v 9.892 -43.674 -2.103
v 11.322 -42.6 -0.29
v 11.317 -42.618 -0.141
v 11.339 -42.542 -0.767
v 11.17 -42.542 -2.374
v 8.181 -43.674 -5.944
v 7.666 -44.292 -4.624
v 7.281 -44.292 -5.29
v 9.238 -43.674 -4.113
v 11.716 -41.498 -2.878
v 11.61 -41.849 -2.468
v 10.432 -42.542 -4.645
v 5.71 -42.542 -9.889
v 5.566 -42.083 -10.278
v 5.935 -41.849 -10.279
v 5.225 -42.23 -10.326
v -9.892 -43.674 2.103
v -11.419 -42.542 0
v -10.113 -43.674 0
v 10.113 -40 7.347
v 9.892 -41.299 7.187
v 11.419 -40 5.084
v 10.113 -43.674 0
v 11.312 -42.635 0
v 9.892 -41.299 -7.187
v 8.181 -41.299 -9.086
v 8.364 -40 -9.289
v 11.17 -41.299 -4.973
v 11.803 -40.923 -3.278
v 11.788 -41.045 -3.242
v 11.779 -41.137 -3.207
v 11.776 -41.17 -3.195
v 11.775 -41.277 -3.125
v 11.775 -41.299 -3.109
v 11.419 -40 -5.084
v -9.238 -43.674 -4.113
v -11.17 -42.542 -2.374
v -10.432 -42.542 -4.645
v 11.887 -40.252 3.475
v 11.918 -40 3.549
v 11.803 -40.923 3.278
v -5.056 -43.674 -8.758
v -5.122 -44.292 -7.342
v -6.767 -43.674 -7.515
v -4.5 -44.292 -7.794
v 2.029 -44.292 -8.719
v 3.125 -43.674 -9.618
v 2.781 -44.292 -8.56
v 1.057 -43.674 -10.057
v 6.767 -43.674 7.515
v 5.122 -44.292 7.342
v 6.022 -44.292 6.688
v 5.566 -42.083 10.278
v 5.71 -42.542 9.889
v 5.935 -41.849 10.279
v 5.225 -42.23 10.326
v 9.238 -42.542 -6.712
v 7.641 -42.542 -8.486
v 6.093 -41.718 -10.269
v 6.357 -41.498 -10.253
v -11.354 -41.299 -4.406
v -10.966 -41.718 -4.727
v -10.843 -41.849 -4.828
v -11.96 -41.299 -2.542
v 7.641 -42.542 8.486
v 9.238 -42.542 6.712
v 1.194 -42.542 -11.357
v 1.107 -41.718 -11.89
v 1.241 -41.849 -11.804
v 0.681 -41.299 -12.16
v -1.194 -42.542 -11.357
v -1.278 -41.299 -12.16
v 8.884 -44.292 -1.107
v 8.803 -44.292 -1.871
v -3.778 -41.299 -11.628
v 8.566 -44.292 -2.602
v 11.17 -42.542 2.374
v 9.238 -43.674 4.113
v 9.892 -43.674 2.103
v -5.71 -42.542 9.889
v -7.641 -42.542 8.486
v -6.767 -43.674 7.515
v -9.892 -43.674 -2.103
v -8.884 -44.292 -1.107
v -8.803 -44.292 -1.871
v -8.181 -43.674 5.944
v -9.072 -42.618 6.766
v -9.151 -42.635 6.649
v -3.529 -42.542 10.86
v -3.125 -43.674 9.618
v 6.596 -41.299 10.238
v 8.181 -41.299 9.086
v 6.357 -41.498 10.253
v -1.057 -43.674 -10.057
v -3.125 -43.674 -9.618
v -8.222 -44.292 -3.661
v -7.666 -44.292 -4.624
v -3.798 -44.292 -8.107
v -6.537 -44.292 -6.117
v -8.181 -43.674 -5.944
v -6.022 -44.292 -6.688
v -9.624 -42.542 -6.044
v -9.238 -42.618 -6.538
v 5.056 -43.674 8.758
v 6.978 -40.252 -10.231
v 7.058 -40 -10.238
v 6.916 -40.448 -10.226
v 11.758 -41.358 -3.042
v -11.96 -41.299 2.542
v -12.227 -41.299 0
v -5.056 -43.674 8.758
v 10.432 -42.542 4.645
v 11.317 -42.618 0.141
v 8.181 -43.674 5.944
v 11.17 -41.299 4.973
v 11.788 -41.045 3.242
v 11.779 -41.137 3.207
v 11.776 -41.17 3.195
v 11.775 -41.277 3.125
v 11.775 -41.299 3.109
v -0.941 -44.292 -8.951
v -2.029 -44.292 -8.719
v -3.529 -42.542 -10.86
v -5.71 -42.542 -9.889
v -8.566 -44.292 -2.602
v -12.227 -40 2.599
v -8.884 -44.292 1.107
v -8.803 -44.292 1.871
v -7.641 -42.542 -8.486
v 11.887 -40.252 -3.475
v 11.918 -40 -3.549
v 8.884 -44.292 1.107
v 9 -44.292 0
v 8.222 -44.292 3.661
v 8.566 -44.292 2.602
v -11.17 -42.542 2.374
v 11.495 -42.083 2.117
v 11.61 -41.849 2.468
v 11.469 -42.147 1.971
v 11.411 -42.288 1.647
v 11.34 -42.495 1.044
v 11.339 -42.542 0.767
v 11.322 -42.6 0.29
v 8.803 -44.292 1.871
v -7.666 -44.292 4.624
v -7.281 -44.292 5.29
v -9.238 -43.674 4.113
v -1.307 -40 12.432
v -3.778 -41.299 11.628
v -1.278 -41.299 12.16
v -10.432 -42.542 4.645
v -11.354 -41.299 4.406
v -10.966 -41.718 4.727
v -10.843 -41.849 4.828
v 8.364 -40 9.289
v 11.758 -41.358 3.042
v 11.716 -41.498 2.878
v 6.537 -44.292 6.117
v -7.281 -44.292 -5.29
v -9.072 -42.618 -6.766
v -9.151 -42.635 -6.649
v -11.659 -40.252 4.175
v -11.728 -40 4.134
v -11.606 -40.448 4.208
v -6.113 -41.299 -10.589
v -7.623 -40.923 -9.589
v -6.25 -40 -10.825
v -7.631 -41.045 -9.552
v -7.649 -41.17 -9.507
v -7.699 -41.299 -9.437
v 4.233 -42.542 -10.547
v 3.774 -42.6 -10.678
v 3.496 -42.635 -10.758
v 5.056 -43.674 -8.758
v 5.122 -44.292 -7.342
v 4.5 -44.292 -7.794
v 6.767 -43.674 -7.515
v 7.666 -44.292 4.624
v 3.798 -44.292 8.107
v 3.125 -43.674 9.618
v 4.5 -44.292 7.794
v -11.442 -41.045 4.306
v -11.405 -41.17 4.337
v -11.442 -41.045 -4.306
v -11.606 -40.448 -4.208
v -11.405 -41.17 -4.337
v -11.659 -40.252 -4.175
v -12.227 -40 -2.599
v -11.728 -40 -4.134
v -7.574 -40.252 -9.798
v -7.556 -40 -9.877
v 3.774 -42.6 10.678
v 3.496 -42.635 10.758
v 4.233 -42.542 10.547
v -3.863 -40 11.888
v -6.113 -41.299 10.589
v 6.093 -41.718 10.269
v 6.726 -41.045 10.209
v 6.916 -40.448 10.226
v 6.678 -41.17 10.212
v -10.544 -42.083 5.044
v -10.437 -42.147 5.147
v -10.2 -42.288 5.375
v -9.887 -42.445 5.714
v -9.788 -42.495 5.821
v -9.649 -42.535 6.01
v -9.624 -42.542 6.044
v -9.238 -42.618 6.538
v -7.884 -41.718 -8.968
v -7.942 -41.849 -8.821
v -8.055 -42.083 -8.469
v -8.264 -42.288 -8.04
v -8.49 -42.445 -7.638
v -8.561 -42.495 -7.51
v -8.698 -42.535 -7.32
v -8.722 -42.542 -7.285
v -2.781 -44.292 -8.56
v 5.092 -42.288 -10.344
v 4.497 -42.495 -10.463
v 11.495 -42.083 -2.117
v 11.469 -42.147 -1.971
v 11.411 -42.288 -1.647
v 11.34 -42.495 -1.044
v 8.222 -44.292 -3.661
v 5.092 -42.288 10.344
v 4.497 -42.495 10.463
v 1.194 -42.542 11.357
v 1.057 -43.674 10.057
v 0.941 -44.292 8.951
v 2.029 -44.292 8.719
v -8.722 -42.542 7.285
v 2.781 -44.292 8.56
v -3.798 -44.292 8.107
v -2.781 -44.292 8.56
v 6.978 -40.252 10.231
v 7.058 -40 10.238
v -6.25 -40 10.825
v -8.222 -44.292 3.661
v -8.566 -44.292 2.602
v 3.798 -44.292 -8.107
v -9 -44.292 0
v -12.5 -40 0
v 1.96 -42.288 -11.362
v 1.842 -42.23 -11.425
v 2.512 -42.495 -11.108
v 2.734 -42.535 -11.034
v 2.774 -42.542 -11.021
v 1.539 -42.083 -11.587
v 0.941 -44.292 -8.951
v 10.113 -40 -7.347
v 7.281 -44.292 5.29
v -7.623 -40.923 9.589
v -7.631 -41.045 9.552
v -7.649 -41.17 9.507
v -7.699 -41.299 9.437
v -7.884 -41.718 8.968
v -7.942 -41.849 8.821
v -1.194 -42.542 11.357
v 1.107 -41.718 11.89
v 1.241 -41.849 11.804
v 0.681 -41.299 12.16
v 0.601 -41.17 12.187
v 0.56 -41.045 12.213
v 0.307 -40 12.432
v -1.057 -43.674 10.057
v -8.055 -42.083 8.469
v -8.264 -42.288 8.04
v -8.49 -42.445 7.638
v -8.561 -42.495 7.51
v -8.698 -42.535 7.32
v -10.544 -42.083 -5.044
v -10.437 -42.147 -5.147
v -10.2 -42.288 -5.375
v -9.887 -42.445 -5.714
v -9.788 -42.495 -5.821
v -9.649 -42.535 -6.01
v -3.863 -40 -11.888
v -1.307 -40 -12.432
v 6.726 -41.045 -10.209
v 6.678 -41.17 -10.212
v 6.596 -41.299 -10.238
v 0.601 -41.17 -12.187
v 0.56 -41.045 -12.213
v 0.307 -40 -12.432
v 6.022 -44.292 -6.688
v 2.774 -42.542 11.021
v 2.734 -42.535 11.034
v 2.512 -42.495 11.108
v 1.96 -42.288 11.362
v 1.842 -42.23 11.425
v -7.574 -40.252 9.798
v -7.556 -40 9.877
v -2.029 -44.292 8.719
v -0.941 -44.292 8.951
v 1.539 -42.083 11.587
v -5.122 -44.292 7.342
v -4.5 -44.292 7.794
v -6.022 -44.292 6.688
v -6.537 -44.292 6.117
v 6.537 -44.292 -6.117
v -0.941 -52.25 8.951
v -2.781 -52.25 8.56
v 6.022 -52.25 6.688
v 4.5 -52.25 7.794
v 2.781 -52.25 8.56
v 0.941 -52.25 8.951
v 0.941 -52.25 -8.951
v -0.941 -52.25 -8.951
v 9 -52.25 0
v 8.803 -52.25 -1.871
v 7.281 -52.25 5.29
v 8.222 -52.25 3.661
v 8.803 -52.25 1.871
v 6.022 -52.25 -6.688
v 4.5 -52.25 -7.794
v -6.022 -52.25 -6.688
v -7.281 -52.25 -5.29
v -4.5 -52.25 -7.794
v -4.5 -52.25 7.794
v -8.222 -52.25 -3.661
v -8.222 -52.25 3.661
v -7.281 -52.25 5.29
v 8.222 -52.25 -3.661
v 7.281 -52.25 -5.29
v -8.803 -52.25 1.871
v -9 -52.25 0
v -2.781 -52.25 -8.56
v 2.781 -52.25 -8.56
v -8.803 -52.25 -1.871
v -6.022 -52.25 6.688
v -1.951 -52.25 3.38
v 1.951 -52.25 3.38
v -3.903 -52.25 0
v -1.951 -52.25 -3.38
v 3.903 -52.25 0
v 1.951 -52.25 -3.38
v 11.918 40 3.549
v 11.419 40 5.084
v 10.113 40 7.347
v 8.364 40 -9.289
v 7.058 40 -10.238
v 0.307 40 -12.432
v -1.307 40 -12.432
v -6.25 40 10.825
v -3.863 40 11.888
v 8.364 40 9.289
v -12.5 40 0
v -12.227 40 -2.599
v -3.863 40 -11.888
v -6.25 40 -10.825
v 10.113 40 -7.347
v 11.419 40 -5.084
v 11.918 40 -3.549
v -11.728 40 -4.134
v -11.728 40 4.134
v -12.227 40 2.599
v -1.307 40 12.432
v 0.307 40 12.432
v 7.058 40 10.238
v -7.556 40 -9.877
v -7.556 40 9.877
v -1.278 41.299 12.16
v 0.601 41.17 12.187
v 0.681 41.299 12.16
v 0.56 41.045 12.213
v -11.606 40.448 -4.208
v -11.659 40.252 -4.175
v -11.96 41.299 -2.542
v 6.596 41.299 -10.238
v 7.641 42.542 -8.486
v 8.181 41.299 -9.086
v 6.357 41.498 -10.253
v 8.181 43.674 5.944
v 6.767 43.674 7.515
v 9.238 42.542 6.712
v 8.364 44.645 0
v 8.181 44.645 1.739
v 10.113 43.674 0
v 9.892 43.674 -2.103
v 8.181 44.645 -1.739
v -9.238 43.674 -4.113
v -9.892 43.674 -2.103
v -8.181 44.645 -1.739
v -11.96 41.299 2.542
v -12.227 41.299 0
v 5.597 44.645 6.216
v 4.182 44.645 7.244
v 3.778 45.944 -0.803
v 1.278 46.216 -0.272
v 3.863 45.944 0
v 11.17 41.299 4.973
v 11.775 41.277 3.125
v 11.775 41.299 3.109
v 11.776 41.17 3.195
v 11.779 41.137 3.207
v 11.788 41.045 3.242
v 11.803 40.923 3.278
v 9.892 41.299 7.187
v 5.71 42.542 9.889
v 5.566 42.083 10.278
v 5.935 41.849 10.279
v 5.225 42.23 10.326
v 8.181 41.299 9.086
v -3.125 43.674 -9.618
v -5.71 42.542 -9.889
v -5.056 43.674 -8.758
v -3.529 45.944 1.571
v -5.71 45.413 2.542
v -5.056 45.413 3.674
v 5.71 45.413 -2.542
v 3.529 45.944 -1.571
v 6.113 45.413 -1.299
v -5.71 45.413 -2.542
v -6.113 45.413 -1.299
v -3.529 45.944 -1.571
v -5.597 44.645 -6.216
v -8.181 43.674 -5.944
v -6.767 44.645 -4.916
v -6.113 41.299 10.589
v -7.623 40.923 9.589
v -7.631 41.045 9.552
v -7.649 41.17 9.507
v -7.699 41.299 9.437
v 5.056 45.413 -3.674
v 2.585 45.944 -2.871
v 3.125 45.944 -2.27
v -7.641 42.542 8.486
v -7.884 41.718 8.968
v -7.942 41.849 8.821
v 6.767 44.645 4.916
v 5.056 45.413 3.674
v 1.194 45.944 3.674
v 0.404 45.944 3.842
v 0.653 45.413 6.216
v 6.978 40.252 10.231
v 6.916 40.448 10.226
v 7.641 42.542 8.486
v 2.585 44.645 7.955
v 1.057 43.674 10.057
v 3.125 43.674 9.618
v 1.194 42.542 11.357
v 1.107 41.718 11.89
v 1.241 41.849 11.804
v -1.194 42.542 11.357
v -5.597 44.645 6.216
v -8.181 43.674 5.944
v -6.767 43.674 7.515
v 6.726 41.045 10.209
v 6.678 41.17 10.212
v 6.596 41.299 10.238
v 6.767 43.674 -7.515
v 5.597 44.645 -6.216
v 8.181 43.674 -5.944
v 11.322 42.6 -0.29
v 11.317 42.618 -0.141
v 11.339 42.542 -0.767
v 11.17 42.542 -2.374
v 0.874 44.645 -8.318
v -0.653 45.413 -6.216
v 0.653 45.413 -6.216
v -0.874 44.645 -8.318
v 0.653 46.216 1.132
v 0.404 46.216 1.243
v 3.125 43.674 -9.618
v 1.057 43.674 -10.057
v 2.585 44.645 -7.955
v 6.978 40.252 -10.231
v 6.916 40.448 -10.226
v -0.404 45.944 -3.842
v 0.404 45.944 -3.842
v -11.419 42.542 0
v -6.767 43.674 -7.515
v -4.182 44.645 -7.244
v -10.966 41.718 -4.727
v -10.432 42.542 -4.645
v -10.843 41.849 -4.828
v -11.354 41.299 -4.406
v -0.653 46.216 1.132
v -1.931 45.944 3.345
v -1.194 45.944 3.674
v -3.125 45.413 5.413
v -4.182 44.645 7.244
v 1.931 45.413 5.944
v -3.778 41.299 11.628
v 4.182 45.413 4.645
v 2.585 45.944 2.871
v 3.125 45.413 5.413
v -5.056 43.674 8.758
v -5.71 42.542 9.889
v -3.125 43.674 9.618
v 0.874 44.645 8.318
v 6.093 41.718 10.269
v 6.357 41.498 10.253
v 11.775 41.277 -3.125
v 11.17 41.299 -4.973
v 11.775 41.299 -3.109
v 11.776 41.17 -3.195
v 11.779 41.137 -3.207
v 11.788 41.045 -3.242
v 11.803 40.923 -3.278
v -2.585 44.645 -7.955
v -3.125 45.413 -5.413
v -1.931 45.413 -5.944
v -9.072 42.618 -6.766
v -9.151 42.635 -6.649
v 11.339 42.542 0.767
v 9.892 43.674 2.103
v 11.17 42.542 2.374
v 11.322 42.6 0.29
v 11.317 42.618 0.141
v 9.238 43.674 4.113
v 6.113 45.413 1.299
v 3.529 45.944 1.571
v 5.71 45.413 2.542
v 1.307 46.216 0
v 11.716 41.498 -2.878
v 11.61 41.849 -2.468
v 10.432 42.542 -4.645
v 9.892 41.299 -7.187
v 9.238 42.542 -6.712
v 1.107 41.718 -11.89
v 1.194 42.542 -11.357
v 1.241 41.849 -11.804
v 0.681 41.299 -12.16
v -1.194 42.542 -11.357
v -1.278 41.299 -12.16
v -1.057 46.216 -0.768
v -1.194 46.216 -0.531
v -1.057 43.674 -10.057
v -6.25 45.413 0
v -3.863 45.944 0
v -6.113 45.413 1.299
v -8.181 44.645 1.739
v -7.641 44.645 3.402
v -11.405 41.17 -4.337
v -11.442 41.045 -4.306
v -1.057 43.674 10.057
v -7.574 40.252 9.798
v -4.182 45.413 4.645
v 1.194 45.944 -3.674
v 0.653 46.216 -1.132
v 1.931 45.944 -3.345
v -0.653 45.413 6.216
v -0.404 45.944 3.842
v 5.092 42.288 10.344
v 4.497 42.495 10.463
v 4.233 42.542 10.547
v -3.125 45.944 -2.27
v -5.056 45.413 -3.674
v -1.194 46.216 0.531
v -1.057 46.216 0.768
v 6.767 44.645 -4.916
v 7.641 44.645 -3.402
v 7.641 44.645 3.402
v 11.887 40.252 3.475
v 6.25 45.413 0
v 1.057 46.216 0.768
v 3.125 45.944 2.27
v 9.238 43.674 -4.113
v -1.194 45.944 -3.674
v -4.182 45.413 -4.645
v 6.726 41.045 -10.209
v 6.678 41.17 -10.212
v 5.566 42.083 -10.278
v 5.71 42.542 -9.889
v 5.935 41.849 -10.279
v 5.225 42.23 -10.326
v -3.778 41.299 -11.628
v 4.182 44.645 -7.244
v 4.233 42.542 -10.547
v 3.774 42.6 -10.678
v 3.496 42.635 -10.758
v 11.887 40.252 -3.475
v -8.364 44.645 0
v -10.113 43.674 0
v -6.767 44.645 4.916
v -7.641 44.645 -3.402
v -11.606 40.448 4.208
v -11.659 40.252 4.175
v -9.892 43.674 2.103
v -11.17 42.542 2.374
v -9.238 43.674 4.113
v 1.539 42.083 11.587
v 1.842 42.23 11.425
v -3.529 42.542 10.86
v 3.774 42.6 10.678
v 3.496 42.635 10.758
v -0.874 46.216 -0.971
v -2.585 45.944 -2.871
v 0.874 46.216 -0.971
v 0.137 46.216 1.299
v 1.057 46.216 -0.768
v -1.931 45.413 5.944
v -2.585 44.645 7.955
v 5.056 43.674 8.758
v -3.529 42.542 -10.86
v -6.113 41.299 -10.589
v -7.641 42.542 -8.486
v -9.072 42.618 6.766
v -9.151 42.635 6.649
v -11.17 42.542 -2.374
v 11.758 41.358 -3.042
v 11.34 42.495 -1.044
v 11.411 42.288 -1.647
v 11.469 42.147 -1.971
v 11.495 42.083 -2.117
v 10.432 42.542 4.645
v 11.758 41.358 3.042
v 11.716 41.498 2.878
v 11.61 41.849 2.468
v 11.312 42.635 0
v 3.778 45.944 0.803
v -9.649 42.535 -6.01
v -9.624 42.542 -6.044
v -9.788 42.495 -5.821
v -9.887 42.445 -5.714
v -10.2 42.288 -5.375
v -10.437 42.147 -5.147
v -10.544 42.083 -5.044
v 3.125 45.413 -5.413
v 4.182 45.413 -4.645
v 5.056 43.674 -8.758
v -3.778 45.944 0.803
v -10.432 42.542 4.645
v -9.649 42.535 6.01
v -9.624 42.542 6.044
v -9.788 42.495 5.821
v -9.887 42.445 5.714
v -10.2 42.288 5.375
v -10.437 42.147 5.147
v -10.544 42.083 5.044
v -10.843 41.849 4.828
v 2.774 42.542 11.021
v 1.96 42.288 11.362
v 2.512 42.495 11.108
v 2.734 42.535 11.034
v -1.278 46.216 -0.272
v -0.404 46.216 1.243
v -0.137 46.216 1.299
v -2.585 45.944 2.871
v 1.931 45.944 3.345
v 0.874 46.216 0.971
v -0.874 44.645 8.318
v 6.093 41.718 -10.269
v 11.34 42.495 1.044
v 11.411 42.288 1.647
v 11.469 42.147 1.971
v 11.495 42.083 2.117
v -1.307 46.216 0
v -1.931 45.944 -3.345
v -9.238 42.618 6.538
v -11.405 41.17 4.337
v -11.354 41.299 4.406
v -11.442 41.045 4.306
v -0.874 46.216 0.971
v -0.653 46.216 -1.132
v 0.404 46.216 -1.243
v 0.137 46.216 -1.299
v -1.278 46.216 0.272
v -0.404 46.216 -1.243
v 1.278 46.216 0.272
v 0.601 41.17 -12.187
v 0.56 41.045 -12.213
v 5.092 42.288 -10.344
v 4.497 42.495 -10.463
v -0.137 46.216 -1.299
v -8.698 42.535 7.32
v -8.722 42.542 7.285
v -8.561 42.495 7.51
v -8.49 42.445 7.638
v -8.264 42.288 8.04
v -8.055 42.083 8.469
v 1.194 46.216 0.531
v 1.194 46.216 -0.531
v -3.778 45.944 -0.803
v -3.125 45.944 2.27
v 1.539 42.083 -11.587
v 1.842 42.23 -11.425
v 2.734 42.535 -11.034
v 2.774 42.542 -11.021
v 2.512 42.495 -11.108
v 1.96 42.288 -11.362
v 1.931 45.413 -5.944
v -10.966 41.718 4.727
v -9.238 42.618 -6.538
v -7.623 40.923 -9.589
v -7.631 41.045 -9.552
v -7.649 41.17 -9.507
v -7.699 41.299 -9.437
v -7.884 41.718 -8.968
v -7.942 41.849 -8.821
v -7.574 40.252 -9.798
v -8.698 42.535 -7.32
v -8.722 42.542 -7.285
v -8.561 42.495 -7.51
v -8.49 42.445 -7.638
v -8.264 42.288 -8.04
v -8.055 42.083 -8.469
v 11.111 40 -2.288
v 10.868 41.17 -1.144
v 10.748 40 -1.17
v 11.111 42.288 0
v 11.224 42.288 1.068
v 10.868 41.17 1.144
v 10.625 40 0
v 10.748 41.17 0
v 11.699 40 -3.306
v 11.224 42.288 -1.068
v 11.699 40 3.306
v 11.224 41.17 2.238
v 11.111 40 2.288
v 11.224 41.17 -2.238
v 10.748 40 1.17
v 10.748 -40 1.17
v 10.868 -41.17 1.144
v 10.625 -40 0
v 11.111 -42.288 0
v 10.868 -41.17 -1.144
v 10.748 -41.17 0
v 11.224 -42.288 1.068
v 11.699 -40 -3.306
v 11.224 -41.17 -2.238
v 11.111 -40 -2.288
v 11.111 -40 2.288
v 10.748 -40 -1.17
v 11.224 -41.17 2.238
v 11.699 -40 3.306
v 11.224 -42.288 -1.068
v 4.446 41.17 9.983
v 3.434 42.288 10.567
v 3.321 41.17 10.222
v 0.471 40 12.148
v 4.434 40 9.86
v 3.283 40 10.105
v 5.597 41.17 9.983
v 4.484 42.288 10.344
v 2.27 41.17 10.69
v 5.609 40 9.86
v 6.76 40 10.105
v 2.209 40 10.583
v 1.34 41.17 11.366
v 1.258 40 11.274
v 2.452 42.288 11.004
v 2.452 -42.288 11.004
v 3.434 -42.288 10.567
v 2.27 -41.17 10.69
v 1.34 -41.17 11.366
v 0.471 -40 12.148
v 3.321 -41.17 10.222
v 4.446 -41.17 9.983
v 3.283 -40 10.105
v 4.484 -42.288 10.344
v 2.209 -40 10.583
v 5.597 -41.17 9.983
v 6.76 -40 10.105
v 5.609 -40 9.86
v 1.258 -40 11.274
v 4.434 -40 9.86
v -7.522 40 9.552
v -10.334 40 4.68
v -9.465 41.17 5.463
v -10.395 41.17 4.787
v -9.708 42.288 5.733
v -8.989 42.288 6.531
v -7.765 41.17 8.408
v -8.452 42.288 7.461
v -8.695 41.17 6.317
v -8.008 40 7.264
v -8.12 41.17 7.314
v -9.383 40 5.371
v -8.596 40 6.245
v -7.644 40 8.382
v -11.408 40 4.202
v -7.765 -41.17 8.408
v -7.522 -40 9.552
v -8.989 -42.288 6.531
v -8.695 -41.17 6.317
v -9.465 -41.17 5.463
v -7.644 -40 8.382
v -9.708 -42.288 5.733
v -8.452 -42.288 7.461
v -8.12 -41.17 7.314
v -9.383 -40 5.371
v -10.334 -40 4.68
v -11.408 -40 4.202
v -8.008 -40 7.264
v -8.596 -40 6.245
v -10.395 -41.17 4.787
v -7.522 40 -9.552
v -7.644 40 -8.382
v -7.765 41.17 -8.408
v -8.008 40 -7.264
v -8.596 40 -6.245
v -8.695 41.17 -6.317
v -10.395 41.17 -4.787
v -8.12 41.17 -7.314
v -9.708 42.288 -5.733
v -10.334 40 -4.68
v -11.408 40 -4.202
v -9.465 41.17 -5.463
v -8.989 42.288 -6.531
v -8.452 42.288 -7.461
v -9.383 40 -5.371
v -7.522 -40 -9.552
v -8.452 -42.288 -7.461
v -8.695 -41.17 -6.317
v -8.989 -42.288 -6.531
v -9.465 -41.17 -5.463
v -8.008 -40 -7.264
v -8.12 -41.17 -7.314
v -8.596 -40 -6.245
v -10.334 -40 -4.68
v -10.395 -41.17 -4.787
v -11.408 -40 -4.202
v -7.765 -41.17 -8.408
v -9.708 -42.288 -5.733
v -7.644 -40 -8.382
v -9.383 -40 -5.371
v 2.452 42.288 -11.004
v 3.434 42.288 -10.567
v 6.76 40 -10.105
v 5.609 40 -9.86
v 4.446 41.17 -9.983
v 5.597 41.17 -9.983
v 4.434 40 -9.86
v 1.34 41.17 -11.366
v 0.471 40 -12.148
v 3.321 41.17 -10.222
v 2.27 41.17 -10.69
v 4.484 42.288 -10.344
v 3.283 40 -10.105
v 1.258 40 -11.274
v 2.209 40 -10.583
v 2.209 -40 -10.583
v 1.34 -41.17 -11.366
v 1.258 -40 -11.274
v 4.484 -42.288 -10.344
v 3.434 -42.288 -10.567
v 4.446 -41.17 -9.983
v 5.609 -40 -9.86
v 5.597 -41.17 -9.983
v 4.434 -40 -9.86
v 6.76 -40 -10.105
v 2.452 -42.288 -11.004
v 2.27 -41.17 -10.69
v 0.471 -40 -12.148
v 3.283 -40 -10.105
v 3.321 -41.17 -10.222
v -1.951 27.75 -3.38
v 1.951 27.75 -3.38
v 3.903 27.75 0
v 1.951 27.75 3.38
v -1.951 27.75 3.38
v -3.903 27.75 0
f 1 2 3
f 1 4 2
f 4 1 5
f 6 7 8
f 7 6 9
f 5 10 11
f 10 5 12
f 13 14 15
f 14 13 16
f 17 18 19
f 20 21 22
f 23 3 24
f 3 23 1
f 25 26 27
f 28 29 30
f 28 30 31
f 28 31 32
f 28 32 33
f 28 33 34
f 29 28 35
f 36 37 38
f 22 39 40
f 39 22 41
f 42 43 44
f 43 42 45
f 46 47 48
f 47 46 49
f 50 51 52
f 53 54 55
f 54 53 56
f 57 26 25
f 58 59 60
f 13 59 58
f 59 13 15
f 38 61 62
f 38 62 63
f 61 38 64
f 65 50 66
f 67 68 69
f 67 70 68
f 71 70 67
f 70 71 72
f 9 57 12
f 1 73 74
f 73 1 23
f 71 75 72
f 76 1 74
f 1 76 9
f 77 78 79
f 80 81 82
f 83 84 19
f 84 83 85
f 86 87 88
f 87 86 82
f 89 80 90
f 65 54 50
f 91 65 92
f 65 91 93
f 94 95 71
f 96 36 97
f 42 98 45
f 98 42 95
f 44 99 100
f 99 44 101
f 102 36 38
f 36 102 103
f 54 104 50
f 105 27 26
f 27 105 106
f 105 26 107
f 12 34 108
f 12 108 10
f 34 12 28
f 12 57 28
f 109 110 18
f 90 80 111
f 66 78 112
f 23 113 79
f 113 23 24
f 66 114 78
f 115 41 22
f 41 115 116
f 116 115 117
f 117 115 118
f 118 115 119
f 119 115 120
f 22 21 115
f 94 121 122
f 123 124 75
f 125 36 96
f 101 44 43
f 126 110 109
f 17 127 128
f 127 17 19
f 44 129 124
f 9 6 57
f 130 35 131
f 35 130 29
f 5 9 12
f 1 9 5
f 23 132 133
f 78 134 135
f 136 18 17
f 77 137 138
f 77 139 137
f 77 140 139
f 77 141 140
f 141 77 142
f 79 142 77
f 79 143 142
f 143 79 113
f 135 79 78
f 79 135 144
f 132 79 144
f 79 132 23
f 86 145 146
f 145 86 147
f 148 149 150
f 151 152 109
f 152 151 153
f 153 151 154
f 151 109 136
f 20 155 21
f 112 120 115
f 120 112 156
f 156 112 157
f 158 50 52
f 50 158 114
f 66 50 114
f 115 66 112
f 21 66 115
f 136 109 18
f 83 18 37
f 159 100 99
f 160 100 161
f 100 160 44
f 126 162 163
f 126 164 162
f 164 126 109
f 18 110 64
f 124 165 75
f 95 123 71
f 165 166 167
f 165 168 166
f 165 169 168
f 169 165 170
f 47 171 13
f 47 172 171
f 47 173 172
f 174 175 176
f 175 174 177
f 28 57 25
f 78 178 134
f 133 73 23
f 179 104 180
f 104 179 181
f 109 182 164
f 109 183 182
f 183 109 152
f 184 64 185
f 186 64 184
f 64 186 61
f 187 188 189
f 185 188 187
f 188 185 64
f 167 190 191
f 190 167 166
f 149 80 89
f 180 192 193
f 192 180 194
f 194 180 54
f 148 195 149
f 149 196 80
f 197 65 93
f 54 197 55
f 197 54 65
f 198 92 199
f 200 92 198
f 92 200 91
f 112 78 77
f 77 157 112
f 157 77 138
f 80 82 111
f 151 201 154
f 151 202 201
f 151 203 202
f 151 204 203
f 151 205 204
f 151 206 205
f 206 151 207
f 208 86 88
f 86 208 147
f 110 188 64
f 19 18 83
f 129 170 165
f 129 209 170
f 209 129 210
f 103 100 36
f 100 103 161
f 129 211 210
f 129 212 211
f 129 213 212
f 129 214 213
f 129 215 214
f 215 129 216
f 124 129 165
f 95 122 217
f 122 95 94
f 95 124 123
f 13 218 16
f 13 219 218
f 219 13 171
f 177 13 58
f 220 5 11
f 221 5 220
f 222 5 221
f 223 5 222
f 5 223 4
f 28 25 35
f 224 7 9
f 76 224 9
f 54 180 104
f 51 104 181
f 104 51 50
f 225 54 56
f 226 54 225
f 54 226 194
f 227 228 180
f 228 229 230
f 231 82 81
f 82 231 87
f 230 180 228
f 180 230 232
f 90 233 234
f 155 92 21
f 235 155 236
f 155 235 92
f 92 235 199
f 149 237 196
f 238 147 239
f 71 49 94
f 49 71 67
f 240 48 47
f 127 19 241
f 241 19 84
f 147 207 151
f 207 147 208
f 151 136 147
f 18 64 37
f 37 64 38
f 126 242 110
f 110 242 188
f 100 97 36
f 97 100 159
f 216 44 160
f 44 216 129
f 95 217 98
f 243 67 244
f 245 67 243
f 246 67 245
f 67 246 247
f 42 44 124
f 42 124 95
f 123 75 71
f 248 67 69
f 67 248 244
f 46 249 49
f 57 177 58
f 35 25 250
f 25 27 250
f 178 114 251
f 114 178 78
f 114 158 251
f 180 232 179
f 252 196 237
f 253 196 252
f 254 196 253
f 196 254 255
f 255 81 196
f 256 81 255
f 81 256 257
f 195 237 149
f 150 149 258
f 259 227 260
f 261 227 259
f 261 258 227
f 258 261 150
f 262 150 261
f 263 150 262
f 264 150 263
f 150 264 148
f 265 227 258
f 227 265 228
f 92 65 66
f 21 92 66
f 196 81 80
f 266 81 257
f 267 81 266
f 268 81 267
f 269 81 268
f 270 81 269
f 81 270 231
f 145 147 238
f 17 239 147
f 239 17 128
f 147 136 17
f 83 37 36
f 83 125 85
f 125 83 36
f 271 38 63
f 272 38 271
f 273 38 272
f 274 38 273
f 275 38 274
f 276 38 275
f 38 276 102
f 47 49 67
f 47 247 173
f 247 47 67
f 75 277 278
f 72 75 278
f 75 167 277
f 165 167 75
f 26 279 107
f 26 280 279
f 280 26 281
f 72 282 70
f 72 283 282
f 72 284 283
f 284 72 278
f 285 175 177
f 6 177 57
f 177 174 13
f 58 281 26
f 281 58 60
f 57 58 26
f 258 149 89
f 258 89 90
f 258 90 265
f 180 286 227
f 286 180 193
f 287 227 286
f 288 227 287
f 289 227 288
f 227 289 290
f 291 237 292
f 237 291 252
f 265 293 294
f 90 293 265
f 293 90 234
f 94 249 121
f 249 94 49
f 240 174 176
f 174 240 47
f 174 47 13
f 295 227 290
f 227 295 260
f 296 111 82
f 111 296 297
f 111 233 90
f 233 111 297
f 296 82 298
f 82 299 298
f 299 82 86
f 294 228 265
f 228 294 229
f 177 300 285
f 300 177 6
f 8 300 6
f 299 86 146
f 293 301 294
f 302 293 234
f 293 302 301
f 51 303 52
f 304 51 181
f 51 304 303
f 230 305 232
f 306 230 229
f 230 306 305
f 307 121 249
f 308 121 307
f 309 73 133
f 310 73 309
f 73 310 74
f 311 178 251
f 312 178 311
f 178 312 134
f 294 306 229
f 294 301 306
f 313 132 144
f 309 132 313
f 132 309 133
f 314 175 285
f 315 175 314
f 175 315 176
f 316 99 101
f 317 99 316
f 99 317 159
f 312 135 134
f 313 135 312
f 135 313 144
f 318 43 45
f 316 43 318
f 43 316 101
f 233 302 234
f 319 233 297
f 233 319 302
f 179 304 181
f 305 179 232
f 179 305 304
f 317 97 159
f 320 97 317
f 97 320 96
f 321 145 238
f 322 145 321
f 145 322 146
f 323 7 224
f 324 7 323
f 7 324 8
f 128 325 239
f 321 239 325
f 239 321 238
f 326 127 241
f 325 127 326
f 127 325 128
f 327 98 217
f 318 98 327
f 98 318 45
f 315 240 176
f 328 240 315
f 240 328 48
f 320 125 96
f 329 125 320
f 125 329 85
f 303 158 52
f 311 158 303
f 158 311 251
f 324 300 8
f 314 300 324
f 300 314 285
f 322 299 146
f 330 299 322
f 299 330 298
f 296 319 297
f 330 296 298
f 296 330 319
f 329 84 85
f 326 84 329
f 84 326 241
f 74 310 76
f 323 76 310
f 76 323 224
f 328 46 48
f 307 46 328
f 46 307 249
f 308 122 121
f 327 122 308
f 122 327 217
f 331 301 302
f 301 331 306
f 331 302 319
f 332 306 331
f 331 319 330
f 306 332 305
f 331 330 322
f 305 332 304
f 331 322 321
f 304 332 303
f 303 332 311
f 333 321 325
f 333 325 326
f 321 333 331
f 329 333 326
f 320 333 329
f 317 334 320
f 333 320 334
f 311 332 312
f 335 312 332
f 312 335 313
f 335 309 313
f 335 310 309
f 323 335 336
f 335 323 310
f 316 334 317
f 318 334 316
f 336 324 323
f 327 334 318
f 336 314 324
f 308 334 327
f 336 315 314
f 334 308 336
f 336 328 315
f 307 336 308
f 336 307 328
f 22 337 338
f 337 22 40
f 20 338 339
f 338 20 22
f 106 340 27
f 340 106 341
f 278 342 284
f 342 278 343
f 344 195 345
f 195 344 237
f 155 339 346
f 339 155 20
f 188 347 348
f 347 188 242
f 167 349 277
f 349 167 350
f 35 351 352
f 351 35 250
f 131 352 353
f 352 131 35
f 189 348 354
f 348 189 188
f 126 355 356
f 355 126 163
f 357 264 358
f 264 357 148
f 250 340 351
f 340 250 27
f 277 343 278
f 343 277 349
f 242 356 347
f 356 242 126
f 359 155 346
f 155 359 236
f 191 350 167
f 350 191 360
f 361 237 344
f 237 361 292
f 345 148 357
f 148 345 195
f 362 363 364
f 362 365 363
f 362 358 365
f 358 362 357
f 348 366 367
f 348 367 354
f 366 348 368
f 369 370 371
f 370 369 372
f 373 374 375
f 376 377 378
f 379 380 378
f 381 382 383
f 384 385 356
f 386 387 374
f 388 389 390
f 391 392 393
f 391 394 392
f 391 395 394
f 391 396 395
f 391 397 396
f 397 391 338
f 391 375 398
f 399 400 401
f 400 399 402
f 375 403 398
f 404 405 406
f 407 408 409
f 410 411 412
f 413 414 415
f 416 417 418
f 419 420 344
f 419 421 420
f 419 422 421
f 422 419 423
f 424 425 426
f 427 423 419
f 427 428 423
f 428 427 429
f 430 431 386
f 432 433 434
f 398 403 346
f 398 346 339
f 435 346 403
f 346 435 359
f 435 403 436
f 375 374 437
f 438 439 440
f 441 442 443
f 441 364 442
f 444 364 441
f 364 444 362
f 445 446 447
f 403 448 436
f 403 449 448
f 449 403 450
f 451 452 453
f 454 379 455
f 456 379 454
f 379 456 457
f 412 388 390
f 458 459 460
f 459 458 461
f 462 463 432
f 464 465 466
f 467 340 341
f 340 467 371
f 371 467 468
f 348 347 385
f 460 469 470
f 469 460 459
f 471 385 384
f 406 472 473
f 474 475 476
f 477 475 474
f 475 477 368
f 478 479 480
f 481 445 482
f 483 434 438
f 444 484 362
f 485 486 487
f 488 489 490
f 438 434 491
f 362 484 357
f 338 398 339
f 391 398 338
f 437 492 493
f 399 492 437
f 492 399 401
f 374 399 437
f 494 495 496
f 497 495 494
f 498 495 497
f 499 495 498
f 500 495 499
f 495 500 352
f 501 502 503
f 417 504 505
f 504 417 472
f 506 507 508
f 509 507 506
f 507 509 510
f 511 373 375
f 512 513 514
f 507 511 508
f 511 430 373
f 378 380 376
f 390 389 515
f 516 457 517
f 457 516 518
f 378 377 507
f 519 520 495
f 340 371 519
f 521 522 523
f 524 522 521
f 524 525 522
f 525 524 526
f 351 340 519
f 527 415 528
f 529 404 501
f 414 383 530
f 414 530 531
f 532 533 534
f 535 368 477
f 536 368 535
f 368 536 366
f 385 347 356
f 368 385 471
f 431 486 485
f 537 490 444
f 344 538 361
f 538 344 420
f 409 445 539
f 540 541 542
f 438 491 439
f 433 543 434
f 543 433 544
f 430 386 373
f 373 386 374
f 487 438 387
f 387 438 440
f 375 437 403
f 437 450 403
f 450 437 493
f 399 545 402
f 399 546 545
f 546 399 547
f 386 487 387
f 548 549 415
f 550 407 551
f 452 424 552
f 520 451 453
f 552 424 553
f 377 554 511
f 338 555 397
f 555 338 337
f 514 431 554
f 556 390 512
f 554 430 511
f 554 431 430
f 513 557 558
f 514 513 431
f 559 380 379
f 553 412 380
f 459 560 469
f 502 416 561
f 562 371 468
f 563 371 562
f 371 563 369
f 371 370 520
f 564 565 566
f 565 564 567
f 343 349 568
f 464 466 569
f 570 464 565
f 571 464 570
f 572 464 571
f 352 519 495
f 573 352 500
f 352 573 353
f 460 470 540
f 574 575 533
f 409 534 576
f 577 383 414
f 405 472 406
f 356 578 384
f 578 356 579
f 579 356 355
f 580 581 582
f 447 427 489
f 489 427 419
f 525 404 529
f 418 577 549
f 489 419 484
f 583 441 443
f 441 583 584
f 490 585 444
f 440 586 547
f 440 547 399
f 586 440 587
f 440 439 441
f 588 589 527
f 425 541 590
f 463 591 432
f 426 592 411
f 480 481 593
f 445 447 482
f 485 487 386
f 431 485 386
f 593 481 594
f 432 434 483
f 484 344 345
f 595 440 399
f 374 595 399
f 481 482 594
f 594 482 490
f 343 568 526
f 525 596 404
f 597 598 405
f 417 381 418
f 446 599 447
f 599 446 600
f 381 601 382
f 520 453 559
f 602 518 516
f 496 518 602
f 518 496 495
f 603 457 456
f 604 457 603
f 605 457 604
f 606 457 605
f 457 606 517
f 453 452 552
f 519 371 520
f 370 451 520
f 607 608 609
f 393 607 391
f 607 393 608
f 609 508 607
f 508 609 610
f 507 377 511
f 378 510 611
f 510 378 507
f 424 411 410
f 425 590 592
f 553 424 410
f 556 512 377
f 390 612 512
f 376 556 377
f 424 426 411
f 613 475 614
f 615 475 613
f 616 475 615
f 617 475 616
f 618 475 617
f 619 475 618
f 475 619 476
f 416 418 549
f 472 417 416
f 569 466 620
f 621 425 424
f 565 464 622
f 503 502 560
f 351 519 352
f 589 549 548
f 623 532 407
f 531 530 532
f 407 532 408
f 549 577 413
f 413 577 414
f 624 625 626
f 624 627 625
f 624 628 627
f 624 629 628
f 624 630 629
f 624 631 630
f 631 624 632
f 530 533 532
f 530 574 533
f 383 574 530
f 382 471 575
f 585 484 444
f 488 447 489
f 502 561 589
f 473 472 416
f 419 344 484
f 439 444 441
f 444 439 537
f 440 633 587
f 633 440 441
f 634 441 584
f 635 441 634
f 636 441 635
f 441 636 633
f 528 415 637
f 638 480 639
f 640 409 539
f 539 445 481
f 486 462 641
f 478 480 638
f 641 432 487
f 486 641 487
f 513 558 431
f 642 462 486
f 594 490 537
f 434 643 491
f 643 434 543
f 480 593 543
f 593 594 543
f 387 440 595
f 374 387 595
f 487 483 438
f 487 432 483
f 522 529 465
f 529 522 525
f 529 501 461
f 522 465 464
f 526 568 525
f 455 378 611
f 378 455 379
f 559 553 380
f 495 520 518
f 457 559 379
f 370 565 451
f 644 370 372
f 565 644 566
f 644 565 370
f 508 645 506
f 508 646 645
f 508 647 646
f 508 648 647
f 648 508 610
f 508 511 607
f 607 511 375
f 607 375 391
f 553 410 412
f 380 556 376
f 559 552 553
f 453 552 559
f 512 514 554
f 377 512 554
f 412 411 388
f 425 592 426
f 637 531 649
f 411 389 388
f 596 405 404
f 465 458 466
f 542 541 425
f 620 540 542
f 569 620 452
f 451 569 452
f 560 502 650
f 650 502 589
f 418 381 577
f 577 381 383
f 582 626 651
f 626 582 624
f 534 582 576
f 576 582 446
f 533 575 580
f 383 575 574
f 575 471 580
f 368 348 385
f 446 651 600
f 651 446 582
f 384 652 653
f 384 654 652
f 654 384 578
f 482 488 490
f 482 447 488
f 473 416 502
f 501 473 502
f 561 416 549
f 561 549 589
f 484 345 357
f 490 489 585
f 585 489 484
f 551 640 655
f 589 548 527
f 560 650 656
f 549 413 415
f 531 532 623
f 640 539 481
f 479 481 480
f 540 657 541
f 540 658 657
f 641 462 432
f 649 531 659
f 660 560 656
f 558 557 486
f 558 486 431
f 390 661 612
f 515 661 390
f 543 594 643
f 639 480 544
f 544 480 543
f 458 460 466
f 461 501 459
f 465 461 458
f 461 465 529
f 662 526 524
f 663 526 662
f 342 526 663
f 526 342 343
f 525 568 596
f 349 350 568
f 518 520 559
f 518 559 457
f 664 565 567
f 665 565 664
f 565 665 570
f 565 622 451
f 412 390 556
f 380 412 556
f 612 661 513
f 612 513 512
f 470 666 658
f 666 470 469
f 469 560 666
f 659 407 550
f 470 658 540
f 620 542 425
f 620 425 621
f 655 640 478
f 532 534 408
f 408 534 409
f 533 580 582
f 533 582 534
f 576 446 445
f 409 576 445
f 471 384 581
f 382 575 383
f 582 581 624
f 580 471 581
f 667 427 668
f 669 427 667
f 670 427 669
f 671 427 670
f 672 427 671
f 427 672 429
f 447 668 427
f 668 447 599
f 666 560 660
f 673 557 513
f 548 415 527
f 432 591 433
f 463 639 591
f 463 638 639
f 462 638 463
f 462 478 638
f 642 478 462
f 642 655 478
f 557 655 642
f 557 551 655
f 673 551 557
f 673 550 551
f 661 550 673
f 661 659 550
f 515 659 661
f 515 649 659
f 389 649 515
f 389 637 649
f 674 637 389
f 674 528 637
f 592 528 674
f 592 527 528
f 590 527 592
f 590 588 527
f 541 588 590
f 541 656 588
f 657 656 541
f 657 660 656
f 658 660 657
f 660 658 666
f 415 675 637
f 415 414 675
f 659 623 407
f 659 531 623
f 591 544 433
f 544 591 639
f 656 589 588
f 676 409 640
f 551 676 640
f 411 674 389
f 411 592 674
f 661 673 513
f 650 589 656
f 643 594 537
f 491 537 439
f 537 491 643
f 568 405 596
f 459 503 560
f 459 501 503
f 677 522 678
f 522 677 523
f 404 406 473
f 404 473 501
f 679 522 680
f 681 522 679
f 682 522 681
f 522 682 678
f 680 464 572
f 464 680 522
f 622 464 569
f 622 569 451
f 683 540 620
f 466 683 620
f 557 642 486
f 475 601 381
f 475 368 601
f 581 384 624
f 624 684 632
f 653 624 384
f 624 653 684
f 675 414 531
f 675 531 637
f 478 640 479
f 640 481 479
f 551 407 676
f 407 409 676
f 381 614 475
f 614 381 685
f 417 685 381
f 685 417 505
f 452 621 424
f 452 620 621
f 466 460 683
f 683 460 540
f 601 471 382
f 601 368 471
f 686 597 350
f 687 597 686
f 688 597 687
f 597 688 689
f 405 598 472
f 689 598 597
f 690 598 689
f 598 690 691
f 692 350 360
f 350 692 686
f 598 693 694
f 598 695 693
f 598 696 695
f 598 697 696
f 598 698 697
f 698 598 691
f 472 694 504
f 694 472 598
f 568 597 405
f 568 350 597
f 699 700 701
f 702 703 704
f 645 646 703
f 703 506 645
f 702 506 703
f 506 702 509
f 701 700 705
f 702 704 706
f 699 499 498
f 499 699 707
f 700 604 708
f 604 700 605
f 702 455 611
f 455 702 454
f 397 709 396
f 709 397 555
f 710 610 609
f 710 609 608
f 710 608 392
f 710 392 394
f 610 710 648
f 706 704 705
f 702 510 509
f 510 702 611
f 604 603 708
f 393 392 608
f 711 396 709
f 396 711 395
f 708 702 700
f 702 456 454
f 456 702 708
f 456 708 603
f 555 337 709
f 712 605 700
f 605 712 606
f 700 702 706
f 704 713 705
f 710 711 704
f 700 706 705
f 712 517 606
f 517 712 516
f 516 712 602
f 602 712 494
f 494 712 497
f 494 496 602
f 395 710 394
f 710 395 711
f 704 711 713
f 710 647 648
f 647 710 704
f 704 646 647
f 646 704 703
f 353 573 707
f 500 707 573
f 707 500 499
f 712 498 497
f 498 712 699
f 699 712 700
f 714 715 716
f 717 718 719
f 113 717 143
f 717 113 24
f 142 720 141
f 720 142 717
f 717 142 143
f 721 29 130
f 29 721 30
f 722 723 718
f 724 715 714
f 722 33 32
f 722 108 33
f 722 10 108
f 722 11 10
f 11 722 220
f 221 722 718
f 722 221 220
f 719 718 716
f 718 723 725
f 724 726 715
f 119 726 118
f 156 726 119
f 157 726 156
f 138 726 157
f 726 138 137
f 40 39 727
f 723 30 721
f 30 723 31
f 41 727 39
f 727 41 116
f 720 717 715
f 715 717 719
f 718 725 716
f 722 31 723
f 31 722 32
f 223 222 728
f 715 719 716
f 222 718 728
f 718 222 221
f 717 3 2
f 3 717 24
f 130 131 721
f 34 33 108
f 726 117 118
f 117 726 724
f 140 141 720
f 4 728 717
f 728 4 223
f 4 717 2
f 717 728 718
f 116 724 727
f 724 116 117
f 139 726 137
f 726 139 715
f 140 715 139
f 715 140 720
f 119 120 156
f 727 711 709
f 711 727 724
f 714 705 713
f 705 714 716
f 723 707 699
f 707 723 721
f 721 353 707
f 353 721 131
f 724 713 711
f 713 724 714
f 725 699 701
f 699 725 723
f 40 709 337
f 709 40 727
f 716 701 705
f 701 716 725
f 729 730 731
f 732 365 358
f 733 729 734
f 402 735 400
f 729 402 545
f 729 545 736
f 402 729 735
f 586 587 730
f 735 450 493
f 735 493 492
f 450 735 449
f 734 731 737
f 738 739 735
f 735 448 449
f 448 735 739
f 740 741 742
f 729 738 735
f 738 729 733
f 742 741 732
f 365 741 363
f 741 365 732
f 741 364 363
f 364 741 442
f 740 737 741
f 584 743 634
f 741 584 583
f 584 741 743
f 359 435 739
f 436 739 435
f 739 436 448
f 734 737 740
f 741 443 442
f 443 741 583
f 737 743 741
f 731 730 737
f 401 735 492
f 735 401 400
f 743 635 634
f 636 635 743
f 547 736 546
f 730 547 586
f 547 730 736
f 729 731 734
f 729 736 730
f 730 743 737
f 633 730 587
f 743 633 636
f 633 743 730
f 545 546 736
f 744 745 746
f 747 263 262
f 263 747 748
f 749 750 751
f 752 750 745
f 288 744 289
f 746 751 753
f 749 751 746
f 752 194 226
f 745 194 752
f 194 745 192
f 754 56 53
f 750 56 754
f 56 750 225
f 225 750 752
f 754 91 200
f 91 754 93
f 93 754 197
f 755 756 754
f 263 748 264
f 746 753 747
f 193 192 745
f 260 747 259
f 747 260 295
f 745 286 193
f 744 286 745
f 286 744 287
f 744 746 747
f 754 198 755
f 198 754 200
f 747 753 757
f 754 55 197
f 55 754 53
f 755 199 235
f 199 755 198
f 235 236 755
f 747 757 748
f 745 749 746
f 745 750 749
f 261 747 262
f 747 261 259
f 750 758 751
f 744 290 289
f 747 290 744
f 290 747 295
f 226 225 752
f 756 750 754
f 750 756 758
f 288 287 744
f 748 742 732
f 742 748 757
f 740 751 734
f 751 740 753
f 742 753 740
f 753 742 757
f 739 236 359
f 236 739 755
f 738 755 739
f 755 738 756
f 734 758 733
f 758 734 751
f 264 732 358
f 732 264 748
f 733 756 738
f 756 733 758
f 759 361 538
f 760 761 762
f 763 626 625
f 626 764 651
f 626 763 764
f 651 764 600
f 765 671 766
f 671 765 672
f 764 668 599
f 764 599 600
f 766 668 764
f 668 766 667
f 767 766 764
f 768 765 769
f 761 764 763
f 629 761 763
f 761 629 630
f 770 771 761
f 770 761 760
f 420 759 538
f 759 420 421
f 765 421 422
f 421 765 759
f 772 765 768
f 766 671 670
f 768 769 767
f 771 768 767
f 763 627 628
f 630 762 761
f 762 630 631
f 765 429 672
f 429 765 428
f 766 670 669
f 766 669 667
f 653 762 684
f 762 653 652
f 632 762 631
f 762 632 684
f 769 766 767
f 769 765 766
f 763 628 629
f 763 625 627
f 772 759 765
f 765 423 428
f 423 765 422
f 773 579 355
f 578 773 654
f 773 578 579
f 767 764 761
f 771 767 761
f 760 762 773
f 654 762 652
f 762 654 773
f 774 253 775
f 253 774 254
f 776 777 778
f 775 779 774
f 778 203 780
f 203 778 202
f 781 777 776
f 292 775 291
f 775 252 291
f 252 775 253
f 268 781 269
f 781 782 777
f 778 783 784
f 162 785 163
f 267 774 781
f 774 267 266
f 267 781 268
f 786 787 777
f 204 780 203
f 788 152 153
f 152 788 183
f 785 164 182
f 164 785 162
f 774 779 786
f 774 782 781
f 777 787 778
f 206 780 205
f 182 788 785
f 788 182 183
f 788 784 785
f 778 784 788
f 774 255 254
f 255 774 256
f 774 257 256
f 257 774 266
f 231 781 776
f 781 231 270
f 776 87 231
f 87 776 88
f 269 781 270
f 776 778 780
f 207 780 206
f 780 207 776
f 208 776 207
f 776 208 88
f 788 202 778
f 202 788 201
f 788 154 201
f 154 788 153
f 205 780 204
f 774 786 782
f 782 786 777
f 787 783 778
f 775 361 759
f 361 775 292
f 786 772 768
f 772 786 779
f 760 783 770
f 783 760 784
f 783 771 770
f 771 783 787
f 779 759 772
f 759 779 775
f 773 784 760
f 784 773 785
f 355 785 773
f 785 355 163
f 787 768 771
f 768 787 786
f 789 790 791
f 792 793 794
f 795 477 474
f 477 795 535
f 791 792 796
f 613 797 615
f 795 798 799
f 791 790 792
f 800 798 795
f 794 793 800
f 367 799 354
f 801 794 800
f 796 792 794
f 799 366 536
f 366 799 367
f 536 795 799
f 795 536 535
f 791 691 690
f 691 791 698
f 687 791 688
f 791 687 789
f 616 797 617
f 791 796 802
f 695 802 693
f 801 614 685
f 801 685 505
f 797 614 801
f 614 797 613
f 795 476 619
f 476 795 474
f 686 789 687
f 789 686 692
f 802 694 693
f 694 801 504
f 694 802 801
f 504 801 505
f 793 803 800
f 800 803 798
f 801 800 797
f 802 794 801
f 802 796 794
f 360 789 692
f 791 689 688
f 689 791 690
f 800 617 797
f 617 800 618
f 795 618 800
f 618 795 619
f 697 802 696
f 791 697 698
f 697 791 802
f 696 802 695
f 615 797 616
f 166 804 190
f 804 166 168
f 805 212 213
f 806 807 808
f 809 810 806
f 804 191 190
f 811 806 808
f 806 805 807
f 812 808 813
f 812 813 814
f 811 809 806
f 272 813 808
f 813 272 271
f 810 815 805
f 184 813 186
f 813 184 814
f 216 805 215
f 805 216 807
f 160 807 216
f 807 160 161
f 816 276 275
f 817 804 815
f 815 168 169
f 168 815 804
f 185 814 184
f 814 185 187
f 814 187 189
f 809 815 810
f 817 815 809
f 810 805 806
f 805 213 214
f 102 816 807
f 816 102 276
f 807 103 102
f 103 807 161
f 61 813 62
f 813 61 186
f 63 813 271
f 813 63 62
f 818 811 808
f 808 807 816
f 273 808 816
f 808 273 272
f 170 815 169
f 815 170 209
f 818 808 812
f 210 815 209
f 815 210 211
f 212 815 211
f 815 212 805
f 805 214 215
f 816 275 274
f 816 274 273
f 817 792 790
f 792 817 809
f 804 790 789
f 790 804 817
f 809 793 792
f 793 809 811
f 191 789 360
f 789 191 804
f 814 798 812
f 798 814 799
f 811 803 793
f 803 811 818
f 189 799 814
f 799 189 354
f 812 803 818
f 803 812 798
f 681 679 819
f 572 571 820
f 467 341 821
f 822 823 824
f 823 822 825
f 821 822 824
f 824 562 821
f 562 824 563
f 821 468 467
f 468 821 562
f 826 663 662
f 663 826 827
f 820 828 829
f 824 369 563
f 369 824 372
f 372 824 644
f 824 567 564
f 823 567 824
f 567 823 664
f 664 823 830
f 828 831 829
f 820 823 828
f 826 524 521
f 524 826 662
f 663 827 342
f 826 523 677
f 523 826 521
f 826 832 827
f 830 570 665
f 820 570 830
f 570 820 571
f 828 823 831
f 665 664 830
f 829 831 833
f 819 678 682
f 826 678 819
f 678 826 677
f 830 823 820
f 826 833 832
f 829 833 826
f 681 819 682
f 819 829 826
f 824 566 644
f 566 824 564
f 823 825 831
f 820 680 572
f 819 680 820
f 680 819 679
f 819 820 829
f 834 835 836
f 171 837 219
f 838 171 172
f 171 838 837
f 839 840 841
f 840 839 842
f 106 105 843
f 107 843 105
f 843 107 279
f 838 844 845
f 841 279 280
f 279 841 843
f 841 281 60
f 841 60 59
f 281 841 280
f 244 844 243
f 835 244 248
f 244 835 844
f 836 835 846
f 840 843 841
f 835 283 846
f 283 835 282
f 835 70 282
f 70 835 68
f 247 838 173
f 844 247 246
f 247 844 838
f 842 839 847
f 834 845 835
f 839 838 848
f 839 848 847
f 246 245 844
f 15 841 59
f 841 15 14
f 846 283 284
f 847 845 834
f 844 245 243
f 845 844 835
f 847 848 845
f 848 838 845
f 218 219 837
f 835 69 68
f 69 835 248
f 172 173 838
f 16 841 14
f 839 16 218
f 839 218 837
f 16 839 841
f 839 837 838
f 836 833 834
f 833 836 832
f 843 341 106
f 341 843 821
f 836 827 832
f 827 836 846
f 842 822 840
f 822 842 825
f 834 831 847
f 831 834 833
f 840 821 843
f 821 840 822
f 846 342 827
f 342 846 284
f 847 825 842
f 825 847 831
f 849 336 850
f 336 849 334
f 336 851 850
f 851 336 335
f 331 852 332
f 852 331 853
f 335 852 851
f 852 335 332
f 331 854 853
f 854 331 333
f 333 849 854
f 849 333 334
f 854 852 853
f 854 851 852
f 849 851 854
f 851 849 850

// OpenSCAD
////----CustomHandle.scad----
////----OpenSCAD 2015.03-2----
////----2018.7.7----
////----By Kijja Chaovanakij----

////----Update 2018.7.30
////----Change input size of square hole or hexagon hole from diagonal dimension to opposite side dimension.

/* [var] */
//number of fragments[30=low:40=medium:60=high]
$fn=30;
//reduce garbage in preview[0.002]
garbage=0.002;

/* [hole var] */
//diameter for round hole[8.0] or side to opposite side for square hole or hexagon hole[6.24]
hole_dia=6.24;
//open-end = hole depth[80] > total handle length[in console windows]
hole_dept=80;
//hole tolerance[0.30-0.45]
hole_tolerance=0.3;
//1=square:2=hexagon:other=round
hole_type=2;

/* [collet var] */
//collet diameter[15] >= hole diameter +5mm.
collet_dia=18;
//collet length[6]
collet_len=8;
//adjust distance between collet and holder [0.00-0.4]
offset_adjust=0.34;

/* [handle var] */
//handle diameter[25] >= hole diameter +7mm.
handle_dia=25;
//handle length[80]
handle_len=80;
//number of groove[0-8]
groove=5;
//1=flat:other=round
end_type=0;
//1=yes:other=no
hook_type=0;

/* [shield var] */
//shield thickness[2.5]
shield_thick=2.5;
//shield wing width[12]
shield_wid=12;
//1=yes:other=no
shield_type=0;
////----end customizer var----

////----translate var----
hole_rad=hole_dia/2;
col_rad=collet_dia/2;
hand_rad=handle_dia/2;
end_fillet_rad=handle_dia/4;
shield_rad=hand_rad+shield_wid-shield_thick/2;
groove_deg=360/groove;
////----end translate var----

////----main----
echo();
echo("total handle length=",handle_len+collet_len+hand_rad*(0.5+offset_adjust));
echo();
rotate([90,0,0])
handle();
////---- end main ----

module handle(){
difference(){
  union(){
    cylinder(handle_len,hand_rad,hand_rad,true);
    
    if (shield_type==1)
      add_shield();
    else
      add_collet();
    
    if (end_type==1)
      flat_end();
    else 
      translate([0,0,-handle_len/2])
        scale([1,1,0.5])
        sphere(hand_rad);
    
    if (hook_type==1)
      add_hook();
  }
  
  for (i=[0:1:groove-1]){
    translate([hand_rad*1.3*cos(i*groove_deg),  hand_rad*1.3*sin(i*groove_deg),0]){
      cylinder(handle_len+hand_rad*0,hand_rad*0.45,hand_rad*0.45,true);
      
      for (j=[-handle_len/2,handle_len/2]){
        translate([0,0,j])
          sphere(hand_rad*0.45);
      }
    }
  }
  
  translate([0,0,handle_len/2+hand_rad*offset_adjust+collet_len-hole_dept])
  if (hole_type==1){
    $fn=4;
    handle_hole(hole_dia/2*sqrt(2));
  }
  else if (hole_type==2){
    $fn=6;
    handle_hole(hole_dia/2/sin(60));
  }
  else
    handle_hole(hole_rad);
}}
////----end handle()----

module add_shield(){
color("MistyRose"){
translate([0,0,handle_len/2])
  cylinder(collet_len+hand_rad*offset_adjust,r=hand_rad);

translate([0,0,handle_len/2+hand_rad*offset_adjust+collet_len-shield_thick/2]){
  cylinder(shield_thick,shield_rad,shield_rad,true);
  rotate_extrude(convexity=5)
    translate([shield_rad,0])
      circle(d=shield_thick);
}}}
////----end add_shield----

module add_collet(){
translate([0,0,handle_len/2])
  scale([1,1,0.5])
  sphere(hand_rad);

color("PaleGreen")
translate([0,0,handle_len/2+hand_rad*offset_adjust])
  cylinder(collet_len,r=col_rad);
}
////----end add_collet----

module flat_end(){
translate([0,0,-handle_len/2-hand_rad/2+end_fillet_rad])
  rotate_extrude(convexity = 10){
    translate([hand_rad/2-end_fillet_rad/2,0])
      square([hand_rad-end_fillet_rad,end_fillet_rad*2],true);
    
    translate([hand_rad-end_fillet_rad,0])
      circle(end_fillet_rad,true);
  }
}
////----end flat_end----

module add_hook(){
translate([0,0,-handle_len/2-hand_rad*0.6])
  rotate([90,0,0])
  rotate_extrude(convexity = 10)
    translate([hand_rad-end_fillet_rad,0])
      circle(hand_rad/6,true);
}
////----end add_hook----

module handle_hole(hole_rad){
cylinder(hole_dept+garbage*2,r=hole_rad+hole_tolerance);
}
////----end handle_hole----
